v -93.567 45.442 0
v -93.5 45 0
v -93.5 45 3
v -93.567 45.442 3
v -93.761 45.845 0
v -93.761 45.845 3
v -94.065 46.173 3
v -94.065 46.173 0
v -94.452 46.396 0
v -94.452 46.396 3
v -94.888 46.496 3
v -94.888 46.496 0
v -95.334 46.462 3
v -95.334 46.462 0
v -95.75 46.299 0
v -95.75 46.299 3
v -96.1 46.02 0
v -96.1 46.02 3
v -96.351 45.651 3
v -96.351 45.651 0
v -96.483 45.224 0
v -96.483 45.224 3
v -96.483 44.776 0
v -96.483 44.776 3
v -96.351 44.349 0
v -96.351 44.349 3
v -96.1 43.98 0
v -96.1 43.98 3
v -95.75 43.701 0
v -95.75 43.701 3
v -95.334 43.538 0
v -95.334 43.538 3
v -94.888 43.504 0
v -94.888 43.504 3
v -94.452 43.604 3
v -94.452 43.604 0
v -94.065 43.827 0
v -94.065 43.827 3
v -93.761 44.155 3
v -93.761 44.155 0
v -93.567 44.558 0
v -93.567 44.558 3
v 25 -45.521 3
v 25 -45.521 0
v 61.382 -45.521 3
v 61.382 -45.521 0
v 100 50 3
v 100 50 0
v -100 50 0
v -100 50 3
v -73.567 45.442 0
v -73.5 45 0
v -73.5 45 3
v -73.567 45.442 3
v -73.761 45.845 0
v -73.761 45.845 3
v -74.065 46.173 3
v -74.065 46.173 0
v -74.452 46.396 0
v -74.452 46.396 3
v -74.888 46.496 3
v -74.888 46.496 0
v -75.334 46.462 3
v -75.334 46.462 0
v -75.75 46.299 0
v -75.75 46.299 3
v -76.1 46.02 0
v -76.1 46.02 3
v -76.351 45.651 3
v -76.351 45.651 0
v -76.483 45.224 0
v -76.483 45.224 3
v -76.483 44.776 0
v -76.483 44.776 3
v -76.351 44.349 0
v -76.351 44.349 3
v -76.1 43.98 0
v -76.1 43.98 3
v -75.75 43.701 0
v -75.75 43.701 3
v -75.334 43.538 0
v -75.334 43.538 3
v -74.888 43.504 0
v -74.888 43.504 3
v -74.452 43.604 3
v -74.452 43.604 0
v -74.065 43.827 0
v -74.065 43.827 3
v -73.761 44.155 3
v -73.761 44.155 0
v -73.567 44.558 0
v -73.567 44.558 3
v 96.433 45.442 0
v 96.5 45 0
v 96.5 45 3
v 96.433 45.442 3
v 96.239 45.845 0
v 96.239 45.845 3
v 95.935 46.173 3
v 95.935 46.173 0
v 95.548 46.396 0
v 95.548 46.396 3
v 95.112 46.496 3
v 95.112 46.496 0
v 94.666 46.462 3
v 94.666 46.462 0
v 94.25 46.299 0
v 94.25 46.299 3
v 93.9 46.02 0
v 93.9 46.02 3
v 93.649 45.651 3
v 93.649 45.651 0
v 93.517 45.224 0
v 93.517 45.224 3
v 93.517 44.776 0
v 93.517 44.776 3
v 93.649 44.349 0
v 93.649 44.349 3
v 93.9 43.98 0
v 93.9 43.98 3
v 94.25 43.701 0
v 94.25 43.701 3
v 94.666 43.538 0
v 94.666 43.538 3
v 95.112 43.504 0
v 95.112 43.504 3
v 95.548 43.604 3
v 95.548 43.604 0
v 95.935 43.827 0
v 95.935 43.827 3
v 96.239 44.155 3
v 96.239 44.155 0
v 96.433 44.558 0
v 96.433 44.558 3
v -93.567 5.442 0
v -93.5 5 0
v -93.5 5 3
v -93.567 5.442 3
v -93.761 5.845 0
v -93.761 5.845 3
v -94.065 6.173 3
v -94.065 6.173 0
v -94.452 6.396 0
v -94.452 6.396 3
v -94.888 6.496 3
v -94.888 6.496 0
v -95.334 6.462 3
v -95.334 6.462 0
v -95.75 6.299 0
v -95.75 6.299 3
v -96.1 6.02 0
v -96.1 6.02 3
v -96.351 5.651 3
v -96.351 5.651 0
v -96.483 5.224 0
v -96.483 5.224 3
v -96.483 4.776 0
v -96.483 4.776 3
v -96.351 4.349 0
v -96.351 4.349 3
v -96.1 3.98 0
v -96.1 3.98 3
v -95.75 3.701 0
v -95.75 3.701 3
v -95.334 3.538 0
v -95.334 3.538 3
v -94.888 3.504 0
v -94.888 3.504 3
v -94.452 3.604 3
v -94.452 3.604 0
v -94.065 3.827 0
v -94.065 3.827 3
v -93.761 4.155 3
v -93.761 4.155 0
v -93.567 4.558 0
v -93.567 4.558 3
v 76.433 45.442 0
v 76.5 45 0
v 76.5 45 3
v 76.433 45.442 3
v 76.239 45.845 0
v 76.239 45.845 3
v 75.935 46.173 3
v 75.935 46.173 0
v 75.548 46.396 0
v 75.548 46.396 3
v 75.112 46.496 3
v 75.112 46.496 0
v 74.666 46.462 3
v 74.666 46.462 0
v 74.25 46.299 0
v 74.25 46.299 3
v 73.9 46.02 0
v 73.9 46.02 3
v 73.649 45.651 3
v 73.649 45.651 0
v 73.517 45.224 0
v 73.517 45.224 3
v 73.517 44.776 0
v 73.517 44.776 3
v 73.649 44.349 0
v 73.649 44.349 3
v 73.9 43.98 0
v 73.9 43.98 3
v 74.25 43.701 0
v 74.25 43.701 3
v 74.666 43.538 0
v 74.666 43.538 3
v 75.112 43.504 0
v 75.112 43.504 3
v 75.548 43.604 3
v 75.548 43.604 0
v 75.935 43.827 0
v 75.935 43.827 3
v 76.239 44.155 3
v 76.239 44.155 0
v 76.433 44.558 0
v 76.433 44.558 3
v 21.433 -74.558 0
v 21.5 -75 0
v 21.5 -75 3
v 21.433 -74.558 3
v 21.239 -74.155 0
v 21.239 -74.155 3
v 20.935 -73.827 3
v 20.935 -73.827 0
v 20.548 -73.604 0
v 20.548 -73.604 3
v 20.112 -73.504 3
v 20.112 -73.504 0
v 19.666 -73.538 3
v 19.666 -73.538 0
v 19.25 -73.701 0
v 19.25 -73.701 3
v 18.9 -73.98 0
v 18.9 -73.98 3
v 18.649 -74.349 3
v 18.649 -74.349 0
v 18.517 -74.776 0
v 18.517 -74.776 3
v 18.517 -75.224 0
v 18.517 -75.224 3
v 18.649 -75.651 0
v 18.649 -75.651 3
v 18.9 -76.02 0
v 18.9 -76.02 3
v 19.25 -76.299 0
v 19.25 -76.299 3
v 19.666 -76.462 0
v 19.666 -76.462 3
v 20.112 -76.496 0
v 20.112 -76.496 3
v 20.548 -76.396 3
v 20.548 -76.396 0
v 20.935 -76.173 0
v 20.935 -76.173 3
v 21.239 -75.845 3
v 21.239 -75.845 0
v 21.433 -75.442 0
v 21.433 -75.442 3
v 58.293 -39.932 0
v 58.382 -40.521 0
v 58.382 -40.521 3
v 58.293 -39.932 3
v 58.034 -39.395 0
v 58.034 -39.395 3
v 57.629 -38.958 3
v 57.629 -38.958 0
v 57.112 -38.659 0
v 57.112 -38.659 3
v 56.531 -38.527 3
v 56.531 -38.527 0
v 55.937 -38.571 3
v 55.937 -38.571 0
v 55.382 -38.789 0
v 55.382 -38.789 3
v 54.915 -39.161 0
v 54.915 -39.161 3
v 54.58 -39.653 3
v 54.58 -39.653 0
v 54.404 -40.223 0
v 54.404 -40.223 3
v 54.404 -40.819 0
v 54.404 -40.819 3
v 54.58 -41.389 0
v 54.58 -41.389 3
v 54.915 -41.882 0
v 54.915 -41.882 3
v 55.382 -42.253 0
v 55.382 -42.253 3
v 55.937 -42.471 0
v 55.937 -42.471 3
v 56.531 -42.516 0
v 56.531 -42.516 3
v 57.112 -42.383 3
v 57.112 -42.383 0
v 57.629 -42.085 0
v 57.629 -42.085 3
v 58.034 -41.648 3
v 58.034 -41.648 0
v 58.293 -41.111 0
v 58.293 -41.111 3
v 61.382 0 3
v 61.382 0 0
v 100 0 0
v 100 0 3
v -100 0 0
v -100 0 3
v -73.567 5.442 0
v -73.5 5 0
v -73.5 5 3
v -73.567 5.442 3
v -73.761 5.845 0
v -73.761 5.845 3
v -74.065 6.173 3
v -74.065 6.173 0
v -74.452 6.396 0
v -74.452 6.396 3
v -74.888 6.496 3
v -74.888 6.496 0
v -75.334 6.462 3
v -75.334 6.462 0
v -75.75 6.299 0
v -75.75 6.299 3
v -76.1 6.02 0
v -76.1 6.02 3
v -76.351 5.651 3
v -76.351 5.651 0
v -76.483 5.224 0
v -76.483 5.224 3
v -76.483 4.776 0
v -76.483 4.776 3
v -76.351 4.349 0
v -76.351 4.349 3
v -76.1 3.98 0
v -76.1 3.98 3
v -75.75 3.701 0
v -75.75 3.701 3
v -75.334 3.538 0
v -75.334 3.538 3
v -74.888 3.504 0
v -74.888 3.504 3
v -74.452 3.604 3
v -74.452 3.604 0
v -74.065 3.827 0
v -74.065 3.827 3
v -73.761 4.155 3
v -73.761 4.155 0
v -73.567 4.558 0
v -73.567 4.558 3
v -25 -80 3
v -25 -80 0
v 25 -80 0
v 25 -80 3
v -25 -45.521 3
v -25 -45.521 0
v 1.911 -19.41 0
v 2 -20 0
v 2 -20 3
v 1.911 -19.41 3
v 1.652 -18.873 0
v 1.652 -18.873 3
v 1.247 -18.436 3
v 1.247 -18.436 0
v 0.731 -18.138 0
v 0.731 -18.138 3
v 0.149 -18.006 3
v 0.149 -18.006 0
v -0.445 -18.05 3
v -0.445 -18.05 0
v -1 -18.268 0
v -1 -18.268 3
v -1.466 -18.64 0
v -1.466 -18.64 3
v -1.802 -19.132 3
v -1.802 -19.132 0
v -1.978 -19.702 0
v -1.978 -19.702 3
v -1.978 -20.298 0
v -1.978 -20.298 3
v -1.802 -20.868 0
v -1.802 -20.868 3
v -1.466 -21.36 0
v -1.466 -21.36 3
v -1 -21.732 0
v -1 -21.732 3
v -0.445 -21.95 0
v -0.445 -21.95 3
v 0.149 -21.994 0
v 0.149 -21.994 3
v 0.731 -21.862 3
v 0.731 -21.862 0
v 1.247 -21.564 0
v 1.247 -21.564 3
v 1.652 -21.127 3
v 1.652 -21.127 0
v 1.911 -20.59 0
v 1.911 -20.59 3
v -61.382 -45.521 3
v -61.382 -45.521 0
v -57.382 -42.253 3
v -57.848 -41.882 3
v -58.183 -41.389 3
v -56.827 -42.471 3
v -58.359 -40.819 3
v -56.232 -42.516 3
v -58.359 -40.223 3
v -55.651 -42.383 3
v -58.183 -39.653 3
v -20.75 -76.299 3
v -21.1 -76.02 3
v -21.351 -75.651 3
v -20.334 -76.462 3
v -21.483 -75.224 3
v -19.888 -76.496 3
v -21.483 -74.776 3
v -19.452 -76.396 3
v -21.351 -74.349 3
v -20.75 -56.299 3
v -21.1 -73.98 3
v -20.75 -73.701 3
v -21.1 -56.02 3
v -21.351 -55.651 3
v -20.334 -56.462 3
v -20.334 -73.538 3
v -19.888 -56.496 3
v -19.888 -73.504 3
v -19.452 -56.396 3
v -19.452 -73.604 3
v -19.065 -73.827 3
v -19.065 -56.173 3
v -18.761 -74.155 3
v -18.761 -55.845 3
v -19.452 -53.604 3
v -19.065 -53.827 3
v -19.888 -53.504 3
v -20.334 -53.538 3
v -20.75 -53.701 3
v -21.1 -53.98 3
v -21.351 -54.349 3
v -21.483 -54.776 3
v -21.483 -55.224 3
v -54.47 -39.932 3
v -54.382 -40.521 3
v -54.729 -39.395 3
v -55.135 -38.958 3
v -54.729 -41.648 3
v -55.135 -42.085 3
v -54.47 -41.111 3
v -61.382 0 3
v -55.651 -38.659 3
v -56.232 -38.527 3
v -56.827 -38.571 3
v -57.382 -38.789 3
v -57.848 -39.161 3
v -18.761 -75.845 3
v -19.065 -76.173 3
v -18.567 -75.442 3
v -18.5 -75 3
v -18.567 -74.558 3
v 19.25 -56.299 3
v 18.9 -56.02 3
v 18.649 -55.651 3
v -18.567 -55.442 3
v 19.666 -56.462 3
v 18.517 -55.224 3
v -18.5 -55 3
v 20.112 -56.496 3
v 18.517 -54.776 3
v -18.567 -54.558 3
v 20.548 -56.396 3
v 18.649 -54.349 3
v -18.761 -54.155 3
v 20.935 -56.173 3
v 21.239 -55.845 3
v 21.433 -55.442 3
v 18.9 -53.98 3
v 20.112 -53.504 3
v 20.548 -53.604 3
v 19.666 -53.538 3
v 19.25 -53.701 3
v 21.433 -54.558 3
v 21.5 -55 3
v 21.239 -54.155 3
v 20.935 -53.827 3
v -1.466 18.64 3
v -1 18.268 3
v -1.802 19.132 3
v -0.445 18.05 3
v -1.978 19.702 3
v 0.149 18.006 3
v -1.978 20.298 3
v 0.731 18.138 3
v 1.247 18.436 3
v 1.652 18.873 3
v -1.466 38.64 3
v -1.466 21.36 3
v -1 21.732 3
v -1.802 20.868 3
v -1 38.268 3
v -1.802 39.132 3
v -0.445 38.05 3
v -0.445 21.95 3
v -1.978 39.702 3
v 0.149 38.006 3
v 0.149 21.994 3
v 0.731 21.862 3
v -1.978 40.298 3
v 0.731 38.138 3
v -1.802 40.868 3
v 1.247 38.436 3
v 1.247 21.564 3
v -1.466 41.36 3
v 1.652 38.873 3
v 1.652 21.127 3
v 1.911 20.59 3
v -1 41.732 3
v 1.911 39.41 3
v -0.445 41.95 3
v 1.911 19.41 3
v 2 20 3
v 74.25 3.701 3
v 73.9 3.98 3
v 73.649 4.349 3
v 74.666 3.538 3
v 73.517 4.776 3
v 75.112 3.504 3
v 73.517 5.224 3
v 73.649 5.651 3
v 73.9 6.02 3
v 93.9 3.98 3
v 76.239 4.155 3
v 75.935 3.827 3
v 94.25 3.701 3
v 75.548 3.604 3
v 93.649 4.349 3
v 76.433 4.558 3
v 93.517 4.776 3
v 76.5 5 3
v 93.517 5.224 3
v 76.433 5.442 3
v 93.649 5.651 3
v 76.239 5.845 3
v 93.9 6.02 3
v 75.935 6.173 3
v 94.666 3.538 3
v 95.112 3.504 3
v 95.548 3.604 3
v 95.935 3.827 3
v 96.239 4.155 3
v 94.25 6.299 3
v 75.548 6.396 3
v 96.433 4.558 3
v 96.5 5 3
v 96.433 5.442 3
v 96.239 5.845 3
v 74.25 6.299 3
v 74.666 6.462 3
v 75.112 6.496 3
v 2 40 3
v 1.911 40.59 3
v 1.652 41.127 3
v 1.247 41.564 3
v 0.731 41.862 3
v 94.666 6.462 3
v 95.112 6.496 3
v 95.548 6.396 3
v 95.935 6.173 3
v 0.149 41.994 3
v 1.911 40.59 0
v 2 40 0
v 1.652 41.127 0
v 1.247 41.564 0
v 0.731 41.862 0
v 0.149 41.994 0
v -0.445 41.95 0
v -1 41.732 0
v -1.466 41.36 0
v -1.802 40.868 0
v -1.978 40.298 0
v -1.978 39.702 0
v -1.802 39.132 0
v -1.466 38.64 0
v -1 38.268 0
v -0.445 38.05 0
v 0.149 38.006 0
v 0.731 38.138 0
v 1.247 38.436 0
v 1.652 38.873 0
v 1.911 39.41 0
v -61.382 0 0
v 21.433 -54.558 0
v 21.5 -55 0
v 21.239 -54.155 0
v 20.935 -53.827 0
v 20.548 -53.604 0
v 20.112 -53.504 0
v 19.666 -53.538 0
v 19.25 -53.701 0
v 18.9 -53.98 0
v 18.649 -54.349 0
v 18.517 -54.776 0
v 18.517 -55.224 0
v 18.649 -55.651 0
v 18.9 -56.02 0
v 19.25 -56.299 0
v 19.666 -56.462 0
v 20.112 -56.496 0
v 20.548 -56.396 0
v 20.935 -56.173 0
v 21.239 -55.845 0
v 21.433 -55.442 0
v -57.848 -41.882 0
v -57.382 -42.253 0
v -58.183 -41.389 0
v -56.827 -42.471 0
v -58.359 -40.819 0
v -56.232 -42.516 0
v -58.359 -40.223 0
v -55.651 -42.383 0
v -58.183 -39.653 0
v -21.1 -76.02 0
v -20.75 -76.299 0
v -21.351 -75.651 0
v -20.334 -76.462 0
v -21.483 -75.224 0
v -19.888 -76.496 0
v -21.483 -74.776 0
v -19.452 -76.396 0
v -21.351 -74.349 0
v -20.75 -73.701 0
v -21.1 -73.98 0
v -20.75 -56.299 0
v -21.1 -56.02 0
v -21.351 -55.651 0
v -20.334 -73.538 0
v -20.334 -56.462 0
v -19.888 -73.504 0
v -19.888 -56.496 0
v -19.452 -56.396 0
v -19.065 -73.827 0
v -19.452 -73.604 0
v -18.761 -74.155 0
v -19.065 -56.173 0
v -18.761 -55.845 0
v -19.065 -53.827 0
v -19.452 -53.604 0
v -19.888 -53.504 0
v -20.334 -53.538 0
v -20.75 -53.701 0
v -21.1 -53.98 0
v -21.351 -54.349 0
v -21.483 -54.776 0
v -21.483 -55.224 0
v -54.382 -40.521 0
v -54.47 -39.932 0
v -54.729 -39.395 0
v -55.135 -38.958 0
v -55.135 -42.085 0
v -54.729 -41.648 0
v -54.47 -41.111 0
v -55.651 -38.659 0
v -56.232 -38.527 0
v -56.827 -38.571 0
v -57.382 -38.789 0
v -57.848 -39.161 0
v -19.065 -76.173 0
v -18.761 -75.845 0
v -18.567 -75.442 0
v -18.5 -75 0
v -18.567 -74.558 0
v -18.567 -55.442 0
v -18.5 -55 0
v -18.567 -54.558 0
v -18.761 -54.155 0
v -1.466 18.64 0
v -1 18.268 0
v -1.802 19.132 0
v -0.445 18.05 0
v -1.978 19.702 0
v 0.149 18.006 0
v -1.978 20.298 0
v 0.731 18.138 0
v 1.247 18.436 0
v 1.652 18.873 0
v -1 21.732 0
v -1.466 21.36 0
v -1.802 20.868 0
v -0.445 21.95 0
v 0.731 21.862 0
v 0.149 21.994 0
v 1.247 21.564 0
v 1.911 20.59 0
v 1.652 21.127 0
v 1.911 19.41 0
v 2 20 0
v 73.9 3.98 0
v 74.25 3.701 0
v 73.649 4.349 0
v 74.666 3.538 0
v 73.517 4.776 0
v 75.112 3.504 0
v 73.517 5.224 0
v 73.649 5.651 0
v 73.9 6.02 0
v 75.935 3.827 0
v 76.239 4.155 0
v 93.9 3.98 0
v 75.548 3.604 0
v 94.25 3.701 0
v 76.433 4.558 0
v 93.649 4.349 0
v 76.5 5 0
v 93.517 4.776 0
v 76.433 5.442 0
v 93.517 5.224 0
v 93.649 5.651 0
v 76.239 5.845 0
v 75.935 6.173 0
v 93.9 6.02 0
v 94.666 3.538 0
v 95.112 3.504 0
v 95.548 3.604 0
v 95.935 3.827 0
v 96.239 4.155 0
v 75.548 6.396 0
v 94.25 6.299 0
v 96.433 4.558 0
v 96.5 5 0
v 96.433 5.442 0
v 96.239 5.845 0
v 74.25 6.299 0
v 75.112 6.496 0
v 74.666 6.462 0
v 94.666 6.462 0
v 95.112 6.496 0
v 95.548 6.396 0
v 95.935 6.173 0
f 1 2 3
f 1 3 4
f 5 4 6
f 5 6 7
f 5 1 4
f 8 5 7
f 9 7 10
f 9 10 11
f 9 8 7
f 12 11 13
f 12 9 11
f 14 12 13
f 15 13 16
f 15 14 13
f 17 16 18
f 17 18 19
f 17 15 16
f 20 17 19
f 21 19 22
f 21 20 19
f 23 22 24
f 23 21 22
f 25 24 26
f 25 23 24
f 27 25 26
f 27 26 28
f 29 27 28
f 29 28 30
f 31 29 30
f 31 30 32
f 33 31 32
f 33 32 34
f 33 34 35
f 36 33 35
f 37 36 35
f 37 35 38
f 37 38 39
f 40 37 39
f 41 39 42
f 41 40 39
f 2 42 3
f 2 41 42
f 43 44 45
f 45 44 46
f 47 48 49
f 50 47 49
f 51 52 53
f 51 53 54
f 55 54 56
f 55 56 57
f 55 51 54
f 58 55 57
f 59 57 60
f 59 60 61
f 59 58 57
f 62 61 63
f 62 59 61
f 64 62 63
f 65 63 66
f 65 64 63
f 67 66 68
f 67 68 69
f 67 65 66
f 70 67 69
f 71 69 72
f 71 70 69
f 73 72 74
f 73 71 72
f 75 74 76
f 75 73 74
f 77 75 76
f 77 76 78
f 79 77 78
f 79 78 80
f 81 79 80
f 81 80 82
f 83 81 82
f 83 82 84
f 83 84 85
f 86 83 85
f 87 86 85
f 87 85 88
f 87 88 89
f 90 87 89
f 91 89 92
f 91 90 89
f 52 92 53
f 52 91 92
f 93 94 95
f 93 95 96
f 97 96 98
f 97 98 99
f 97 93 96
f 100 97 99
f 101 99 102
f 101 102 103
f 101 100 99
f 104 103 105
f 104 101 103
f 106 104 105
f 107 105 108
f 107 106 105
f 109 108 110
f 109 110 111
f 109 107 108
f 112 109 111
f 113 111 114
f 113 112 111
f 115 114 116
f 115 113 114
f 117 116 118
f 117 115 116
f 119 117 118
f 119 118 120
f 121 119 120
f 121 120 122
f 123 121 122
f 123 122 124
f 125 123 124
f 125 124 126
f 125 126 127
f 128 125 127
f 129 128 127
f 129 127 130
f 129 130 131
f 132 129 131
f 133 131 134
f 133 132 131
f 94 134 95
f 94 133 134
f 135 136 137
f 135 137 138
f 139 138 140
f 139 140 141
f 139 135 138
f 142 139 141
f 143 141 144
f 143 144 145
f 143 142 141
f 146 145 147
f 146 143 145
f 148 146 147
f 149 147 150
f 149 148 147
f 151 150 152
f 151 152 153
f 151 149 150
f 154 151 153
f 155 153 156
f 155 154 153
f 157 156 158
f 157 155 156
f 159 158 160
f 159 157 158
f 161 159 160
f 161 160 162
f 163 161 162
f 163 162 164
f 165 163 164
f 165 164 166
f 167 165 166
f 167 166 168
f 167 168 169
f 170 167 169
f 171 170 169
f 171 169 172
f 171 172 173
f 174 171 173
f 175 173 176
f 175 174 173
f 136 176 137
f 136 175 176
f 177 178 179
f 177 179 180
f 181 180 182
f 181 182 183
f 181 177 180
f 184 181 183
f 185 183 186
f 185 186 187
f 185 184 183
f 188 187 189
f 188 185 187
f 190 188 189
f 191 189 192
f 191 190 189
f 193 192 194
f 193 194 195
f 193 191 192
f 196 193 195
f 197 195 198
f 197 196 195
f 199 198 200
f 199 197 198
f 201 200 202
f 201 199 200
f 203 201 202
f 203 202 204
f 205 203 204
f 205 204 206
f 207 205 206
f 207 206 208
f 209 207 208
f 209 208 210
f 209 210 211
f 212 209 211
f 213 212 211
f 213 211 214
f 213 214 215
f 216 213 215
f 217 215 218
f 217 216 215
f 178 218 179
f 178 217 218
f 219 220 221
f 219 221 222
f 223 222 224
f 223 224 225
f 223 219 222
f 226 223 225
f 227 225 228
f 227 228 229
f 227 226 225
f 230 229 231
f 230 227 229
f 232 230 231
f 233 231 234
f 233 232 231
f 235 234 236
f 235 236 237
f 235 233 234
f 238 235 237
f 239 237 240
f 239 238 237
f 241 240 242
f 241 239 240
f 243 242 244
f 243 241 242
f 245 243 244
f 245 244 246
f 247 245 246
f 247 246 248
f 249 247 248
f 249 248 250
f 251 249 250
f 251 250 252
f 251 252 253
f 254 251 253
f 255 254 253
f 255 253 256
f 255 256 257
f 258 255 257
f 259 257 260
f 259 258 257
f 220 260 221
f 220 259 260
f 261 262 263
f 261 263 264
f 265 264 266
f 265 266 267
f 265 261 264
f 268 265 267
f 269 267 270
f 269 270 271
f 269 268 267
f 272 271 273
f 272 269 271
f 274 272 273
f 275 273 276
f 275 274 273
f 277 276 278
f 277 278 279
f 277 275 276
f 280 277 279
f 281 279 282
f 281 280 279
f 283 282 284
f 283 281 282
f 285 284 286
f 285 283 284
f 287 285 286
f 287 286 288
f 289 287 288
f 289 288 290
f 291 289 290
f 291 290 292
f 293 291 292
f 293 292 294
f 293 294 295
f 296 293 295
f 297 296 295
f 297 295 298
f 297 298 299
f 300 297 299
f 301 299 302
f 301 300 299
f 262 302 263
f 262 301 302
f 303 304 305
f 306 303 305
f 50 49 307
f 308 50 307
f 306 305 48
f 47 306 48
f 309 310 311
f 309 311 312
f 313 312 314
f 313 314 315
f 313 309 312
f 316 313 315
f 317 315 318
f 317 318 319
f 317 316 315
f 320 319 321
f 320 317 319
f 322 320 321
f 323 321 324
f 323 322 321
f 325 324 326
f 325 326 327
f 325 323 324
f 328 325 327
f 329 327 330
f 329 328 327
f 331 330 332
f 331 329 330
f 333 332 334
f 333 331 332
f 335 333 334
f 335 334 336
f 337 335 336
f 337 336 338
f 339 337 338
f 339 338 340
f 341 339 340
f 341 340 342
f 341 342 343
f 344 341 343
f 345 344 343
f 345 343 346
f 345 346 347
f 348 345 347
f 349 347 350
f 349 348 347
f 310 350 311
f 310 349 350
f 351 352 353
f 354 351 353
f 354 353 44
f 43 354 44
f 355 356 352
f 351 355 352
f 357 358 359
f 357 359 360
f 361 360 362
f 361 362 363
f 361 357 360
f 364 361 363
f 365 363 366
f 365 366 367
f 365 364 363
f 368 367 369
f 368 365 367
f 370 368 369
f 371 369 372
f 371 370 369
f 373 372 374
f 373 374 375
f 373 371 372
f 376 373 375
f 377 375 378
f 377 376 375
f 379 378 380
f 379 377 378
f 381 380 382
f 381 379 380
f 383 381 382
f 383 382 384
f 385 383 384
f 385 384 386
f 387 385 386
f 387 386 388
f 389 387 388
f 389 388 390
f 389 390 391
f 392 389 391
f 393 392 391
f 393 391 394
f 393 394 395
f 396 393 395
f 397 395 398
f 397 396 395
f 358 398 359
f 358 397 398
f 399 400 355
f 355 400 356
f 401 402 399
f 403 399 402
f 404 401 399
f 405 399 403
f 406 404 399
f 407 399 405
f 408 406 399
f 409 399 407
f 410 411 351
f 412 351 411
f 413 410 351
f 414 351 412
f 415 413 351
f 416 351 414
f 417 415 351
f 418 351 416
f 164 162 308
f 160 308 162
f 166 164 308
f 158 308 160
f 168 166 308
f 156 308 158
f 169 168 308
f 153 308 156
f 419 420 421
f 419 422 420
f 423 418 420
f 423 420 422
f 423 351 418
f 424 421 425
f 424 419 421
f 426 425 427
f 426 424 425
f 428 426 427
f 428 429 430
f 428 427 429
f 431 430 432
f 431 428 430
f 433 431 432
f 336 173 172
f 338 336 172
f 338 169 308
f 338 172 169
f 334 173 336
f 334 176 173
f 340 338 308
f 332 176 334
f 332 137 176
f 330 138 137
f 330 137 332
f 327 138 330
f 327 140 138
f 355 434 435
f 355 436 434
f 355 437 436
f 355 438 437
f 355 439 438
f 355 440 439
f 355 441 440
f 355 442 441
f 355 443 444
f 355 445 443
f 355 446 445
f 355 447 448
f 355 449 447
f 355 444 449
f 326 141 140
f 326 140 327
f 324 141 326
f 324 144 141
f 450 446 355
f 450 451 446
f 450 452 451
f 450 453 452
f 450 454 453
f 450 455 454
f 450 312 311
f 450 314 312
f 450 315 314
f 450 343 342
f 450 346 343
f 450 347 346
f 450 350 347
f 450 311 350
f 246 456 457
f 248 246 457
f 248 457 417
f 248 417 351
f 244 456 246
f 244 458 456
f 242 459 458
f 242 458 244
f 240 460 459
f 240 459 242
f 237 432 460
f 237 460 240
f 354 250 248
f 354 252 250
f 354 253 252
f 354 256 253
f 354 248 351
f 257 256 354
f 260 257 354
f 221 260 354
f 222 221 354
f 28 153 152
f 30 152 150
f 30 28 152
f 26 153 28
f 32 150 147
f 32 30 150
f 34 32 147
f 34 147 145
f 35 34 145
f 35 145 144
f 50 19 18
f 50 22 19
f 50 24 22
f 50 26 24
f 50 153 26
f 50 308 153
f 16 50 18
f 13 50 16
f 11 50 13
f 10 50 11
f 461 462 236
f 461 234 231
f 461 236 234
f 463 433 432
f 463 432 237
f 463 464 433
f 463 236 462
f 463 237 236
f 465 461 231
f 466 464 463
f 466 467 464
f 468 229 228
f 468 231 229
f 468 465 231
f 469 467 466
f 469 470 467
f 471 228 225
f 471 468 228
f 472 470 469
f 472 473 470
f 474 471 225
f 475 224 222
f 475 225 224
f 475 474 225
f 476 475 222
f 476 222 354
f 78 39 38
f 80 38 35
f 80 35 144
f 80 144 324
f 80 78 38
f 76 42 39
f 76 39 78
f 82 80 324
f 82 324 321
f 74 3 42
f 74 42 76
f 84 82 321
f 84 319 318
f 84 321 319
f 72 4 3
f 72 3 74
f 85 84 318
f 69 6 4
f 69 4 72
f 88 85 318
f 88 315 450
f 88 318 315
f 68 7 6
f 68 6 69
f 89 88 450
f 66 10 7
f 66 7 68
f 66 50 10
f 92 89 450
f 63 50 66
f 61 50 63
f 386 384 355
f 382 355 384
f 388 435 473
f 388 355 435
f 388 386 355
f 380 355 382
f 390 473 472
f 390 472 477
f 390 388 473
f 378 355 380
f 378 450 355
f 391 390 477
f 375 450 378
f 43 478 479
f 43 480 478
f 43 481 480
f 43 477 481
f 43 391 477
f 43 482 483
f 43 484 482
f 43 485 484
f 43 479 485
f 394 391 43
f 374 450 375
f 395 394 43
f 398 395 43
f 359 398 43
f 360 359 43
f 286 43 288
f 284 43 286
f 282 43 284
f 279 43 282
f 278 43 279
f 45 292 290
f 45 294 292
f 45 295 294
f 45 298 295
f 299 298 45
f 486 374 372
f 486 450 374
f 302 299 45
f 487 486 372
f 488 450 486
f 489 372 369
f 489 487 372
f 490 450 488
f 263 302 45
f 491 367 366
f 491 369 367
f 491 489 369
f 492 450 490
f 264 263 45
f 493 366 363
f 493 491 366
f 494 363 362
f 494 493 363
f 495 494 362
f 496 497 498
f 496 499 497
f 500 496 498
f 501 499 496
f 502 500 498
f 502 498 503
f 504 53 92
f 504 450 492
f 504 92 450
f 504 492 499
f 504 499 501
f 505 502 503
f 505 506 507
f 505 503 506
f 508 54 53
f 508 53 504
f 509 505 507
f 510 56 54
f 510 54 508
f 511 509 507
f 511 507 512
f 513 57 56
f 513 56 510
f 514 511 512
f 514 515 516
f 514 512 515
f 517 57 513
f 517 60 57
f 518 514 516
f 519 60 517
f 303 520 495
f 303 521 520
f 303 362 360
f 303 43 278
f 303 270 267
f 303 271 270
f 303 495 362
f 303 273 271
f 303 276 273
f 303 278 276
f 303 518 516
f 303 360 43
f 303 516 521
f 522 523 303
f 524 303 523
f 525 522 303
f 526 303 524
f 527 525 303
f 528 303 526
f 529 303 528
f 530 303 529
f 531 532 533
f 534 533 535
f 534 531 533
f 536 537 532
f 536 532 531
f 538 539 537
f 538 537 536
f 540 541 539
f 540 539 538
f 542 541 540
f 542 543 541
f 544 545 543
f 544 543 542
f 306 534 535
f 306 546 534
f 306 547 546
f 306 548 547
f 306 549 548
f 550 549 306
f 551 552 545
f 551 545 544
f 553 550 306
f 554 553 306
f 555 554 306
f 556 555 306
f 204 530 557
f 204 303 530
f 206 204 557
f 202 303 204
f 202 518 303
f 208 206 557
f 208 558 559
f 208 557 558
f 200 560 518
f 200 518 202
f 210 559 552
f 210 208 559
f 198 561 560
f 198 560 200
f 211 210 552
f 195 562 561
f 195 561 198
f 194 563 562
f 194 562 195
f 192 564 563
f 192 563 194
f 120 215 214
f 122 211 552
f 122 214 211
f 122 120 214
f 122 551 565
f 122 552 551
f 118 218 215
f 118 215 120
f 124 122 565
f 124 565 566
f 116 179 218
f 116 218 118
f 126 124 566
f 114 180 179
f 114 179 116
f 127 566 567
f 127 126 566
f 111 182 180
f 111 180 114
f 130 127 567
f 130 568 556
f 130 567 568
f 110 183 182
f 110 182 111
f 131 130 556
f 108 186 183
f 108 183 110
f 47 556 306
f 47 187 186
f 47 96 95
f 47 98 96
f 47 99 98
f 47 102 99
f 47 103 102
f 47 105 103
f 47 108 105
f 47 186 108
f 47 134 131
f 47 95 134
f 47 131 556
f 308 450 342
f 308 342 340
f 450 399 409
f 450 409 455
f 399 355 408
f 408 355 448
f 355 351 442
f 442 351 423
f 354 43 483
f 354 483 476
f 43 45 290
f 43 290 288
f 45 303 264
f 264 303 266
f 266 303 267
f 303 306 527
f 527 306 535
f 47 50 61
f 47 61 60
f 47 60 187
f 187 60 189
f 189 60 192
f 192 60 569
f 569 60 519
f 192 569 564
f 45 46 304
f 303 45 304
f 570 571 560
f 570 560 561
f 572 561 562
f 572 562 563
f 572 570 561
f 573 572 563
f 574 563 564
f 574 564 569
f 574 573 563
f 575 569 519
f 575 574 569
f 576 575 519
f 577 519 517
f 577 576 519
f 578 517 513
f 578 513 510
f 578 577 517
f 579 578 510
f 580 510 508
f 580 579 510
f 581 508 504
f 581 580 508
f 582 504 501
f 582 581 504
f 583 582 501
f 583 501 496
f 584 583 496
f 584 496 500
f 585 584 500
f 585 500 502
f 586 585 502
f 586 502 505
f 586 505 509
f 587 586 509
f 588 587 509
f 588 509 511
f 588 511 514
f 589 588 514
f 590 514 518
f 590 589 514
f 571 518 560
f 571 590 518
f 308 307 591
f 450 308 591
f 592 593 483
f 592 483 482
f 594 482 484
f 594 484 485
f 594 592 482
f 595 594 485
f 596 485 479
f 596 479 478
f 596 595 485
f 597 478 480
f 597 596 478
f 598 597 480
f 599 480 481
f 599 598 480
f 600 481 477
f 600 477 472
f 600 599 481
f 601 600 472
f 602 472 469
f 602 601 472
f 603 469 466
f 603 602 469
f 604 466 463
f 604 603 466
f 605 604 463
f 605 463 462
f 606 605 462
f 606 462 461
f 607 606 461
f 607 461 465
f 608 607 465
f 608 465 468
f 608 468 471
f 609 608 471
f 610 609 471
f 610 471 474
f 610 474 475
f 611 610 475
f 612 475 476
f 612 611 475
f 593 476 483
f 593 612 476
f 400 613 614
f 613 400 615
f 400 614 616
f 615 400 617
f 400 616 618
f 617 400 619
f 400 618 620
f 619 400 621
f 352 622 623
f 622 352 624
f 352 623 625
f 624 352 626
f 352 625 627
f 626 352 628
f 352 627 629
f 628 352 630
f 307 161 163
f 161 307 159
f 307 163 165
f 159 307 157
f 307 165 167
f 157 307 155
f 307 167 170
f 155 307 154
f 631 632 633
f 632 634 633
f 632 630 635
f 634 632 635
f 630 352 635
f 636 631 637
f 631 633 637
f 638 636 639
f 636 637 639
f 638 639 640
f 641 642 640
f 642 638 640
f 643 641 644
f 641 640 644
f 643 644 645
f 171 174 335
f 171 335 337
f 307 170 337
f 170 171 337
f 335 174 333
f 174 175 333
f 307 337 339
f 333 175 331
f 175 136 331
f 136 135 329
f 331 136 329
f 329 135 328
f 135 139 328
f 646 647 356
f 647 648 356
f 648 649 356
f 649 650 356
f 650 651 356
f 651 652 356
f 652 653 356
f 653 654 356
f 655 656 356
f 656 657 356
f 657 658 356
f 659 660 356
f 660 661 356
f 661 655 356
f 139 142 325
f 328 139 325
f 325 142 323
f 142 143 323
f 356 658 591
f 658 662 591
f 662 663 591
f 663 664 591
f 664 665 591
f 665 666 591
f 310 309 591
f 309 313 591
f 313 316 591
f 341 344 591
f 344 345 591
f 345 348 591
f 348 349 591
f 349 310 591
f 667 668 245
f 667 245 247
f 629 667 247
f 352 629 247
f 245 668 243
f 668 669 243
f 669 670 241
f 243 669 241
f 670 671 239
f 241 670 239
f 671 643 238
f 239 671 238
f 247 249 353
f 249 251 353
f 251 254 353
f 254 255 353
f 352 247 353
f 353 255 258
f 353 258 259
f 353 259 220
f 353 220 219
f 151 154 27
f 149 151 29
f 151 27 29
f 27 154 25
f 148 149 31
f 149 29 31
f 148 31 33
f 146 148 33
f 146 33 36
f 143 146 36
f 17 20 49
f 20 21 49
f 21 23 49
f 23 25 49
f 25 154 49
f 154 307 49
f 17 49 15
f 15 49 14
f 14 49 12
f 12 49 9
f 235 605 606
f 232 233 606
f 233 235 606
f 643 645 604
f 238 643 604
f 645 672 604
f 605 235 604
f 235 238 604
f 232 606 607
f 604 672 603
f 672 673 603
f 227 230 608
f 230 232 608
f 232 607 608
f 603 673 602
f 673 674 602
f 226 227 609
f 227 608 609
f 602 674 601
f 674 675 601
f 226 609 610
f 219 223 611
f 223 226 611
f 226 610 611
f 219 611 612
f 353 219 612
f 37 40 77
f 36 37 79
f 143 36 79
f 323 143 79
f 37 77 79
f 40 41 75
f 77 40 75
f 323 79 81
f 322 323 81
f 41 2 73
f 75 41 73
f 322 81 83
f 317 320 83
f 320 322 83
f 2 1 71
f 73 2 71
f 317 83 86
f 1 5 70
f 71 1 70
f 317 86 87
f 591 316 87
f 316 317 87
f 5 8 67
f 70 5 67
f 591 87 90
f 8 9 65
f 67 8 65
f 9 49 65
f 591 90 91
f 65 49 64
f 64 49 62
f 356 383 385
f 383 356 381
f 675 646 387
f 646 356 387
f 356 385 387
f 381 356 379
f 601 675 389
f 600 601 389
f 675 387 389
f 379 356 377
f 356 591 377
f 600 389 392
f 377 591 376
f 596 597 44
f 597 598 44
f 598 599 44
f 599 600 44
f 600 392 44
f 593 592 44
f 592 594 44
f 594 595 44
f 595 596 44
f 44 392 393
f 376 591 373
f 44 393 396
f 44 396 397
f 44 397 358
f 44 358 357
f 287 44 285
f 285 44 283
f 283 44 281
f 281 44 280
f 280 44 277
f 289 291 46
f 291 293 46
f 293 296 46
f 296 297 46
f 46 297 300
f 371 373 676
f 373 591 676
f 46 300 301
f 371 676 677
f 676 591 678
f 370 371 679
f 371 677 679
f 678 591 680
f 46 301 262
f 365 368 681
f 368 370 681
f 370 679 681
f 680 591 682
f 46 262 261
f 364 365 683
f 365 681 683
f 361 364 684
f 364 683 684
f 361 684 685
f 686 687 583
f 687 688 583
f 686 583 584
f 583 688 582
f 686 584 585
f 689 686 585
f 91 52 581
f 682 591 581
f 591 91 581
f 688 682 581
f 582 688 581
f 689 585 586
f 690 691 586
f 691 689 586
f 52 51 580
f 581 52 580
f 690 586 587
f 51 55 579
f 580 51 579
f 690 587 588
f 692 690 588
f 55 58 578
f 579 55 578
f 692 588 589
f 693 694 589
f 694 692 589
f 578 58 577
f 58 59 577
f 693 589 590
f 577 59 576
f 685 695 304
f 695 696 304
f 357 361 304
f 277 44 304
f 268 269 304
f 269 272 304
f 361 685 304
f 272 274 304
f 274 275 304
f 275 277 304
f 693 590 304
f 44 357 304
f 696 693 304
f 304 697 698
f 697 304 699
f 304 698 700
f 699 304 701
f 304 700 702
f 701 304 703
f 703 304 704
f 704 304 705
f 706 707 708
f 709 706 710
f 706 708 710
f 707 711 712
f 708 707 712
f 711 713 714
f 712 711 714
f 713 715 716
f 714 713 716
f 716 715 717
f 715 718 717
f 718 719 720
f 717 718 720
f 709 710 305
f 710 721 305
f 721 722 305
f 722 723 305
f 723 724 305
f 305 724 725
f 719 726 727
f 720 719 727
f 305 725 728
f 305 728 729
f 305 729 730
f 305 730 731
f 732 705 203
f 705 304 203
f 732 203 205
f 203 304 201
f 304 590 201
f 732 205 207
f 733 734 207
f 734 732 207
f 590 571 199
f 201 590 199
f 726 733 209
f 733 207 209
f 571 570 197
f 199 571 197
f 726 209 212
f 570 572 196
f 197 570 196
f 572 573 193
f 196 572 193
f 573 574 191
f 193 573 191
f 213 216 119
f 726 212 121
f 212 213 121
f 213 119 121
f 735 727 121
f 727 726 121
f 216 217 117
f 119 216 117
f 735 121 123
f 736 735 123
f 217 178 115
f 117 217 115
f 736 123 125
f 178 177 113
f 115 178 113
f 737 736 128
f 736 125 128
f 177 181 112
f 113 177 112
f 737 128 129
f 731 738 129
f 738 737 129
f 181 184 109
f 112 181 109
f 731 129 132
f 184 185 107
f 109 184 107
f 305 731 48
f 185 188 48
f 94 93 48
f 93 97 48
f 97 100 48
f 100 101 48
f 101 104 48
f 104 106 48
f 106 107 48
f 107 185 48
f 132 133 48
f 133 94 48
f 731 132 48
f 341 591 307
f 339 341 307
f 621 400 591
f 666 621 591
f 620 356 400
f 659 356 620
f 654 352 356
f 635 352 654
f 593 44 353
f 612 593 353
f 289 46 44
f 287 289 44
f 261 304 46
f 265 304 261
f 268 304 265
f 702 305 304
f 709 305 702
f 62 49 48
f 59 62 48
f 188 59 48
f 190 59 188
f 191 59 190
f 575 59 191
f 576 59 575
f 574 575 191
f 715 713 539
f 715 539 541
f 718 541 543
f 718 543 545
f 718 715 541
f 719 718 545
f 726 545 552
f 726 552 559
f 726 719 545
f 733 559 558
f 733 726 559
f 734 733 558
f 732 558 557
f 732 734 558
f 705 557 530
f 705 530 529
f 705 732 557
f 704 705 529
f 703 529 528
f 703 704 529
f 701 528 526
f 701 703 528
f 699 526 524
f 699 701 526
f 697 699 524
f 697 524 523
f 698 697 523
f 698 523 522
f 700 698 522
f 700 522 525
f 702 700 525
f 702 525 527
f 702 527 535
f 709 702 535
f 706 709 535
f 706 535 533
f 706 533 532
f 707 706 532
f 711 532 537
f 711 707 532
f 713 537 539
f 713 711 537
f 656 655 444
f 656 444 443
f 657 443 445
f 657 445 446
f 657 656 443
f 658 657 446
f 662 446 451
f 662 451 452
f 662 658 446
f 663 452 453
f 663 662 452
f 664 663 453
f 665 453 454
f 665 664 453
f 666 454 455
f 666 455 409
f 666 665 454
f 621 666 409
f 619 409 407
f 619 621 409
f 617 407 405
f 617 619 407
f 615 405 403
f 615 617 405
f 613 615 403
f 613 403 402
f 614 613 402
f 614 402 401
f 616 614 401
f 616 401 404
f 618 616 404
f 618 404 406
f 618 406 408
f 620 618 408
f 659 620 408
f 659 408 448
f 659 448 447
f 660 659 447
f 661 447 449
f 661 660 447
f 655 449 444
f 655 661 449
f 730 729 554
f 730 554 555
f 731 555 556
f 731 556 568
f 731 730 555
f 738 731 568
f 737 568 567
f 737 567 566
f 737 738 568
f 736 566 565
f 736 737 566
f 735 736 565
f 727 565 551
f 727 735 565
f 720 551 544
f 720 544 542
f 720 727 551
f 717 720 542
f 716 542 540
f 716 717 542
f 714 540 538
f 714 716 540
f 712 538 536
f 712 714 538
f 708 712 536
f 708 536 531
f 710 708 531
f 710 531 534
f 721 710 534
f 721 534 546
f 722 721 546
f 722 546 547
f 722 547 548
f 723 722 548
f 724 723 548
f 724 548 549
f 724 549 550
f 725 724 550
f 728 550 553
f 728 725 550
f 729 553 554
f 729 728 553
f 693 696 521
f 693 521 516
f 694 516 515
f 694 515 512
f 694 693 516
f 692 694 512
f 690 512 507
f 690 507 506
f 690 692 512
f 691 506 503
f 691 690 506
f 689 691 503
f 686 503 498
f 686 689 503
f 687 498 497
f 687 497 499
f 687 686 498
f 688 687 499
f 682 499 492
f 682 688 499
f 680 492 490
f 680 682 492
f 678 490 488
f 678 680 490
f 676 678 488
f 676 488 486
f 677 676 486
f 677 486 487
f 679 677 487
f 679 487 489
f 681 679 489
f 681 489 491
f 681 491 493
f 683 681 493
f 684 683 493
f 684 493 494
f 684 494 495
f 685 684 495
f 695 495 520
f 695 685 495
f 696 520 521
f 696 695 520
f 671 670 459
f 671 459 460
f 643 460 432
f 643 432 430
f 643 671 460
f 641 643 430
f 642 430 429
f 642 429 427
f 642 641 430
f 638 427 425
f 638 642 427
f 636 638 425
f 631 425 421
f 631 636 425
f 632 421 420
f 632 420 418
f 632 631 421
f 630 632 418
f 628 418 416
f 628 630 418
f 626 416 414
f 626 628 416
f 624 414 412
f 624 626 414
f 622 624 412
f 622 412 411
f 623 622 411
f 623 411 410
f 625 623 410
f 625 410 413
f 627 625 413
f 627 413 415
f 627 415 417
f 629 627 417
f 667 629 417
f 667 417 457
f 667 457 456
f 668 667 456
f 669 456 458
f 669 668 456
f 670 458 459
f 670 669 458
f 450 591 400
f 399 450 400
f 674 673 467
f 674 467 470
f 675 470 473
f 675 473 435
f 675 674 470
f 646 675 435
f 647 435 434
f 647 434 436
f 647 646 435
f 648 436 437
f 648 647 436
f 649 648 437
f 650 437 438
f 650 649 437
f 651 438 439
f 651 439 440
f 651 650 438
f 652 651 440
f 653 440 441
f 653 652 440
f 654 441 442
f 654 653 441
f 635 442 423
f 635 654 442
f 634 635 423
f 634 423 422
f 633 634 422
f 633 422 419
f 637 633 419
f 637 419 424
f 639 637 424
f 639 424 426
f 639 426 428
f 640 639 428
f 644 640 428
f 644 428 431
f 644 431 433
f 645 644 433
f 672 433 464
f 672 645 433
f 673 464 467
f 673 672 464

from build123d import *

# Parameters (mm, degrees)
ESQUISSE1_R        = 2
ESQUISSE1_R_2      = 1.5
BOSS_EXTRU_1_DEPTH = 3


with BuildPart() as part:
    # Esquisse1 → Boss.-Extru.1 (new body)
    with BuildSketch(Plane.XY):
        Polygon((0, 50), (-100, 50), (-100, 0), (-61.381557247, 0), (-61.381557247, -45.5212086), (-25, -45.5212086), (-25, -80), (25, -80), (25, -45.5212086), (61.381557247, -45.5212086), (61.381557247, 0), (100, 0), (100, 50), align=None)
        with Locations((0, 20)):
            Circle(ESQUISSE1_R, mode=Mode.SUBTRACT)
        with Locations((0, -20)):
            Circle(ESQUISSE1_R, mode=Mode.SUBTRACT)
        with Locations((0, 40)):
            Circle(ESQUISSE1_R, mode=Mode.SUBTRACT)
        with Locations((-20, -55)):
            Circle(ESQUISSE1_R_2, mode=Mode.SUBTRACT)
        with Locations((20, -55)):
            Circle(ESQUISSE1_R_2, mode=Mode.SUBTRACT)
        with Locations((20, -75)):
            Circle(ESQUISSE1_R_2, mode=Mode.SUBTRACT)
        with Locations((-20, -75)):
            Circle(ESQUISSE1_R_2, mode=Mode.SUBTRACT)
        with Locations((-95, 45)):
            Circle(ESQUISSE1_R_2, mode=Mode.SUBTRACT)
        with Locations((-75, 45)):
            Circle(ESQUISSE1_R_2, mode=Mode.SUBTRACT)
        with Locations((-75, 5)):
            Circle(ESQUISSE1_R_2, mode=Mode.SUBTRACT)
        with Locations((-95, 5)):
            Circle(ESQUISSE1_R_2, mode=Mode.SUBTRACT)
        with Locations((75, 5)):
            Circle(ESQUISSE1_R_2, mode=Mode.SUBTRACT)
        with Locations((95, 5)):
            Circle(ESQUISSE1_R_2, mode=Mode.SUBTRACT)
        with Locations((75, 45)):
            Circle(ESQUISSE1_R_2, mode=Mode.SUBTRACT)
        with Locations((95, 45)):
            Circle(ESQUISSE1_R_2, mode=Mode.SUBTRACT)
        with Locations((56.381557247, -40.5212086)):
            Circle(ESQUISSE1_R, mode=Mode.SUBTRACT)
        with Locations((-56.381557247, -40.5212086)):
            Circle(ESQUISSE1_R, mode=Mode.SUBTRACT)
    extrude(amount=BOSS_EXTRU_1_DEPTH)


solid = part.part
